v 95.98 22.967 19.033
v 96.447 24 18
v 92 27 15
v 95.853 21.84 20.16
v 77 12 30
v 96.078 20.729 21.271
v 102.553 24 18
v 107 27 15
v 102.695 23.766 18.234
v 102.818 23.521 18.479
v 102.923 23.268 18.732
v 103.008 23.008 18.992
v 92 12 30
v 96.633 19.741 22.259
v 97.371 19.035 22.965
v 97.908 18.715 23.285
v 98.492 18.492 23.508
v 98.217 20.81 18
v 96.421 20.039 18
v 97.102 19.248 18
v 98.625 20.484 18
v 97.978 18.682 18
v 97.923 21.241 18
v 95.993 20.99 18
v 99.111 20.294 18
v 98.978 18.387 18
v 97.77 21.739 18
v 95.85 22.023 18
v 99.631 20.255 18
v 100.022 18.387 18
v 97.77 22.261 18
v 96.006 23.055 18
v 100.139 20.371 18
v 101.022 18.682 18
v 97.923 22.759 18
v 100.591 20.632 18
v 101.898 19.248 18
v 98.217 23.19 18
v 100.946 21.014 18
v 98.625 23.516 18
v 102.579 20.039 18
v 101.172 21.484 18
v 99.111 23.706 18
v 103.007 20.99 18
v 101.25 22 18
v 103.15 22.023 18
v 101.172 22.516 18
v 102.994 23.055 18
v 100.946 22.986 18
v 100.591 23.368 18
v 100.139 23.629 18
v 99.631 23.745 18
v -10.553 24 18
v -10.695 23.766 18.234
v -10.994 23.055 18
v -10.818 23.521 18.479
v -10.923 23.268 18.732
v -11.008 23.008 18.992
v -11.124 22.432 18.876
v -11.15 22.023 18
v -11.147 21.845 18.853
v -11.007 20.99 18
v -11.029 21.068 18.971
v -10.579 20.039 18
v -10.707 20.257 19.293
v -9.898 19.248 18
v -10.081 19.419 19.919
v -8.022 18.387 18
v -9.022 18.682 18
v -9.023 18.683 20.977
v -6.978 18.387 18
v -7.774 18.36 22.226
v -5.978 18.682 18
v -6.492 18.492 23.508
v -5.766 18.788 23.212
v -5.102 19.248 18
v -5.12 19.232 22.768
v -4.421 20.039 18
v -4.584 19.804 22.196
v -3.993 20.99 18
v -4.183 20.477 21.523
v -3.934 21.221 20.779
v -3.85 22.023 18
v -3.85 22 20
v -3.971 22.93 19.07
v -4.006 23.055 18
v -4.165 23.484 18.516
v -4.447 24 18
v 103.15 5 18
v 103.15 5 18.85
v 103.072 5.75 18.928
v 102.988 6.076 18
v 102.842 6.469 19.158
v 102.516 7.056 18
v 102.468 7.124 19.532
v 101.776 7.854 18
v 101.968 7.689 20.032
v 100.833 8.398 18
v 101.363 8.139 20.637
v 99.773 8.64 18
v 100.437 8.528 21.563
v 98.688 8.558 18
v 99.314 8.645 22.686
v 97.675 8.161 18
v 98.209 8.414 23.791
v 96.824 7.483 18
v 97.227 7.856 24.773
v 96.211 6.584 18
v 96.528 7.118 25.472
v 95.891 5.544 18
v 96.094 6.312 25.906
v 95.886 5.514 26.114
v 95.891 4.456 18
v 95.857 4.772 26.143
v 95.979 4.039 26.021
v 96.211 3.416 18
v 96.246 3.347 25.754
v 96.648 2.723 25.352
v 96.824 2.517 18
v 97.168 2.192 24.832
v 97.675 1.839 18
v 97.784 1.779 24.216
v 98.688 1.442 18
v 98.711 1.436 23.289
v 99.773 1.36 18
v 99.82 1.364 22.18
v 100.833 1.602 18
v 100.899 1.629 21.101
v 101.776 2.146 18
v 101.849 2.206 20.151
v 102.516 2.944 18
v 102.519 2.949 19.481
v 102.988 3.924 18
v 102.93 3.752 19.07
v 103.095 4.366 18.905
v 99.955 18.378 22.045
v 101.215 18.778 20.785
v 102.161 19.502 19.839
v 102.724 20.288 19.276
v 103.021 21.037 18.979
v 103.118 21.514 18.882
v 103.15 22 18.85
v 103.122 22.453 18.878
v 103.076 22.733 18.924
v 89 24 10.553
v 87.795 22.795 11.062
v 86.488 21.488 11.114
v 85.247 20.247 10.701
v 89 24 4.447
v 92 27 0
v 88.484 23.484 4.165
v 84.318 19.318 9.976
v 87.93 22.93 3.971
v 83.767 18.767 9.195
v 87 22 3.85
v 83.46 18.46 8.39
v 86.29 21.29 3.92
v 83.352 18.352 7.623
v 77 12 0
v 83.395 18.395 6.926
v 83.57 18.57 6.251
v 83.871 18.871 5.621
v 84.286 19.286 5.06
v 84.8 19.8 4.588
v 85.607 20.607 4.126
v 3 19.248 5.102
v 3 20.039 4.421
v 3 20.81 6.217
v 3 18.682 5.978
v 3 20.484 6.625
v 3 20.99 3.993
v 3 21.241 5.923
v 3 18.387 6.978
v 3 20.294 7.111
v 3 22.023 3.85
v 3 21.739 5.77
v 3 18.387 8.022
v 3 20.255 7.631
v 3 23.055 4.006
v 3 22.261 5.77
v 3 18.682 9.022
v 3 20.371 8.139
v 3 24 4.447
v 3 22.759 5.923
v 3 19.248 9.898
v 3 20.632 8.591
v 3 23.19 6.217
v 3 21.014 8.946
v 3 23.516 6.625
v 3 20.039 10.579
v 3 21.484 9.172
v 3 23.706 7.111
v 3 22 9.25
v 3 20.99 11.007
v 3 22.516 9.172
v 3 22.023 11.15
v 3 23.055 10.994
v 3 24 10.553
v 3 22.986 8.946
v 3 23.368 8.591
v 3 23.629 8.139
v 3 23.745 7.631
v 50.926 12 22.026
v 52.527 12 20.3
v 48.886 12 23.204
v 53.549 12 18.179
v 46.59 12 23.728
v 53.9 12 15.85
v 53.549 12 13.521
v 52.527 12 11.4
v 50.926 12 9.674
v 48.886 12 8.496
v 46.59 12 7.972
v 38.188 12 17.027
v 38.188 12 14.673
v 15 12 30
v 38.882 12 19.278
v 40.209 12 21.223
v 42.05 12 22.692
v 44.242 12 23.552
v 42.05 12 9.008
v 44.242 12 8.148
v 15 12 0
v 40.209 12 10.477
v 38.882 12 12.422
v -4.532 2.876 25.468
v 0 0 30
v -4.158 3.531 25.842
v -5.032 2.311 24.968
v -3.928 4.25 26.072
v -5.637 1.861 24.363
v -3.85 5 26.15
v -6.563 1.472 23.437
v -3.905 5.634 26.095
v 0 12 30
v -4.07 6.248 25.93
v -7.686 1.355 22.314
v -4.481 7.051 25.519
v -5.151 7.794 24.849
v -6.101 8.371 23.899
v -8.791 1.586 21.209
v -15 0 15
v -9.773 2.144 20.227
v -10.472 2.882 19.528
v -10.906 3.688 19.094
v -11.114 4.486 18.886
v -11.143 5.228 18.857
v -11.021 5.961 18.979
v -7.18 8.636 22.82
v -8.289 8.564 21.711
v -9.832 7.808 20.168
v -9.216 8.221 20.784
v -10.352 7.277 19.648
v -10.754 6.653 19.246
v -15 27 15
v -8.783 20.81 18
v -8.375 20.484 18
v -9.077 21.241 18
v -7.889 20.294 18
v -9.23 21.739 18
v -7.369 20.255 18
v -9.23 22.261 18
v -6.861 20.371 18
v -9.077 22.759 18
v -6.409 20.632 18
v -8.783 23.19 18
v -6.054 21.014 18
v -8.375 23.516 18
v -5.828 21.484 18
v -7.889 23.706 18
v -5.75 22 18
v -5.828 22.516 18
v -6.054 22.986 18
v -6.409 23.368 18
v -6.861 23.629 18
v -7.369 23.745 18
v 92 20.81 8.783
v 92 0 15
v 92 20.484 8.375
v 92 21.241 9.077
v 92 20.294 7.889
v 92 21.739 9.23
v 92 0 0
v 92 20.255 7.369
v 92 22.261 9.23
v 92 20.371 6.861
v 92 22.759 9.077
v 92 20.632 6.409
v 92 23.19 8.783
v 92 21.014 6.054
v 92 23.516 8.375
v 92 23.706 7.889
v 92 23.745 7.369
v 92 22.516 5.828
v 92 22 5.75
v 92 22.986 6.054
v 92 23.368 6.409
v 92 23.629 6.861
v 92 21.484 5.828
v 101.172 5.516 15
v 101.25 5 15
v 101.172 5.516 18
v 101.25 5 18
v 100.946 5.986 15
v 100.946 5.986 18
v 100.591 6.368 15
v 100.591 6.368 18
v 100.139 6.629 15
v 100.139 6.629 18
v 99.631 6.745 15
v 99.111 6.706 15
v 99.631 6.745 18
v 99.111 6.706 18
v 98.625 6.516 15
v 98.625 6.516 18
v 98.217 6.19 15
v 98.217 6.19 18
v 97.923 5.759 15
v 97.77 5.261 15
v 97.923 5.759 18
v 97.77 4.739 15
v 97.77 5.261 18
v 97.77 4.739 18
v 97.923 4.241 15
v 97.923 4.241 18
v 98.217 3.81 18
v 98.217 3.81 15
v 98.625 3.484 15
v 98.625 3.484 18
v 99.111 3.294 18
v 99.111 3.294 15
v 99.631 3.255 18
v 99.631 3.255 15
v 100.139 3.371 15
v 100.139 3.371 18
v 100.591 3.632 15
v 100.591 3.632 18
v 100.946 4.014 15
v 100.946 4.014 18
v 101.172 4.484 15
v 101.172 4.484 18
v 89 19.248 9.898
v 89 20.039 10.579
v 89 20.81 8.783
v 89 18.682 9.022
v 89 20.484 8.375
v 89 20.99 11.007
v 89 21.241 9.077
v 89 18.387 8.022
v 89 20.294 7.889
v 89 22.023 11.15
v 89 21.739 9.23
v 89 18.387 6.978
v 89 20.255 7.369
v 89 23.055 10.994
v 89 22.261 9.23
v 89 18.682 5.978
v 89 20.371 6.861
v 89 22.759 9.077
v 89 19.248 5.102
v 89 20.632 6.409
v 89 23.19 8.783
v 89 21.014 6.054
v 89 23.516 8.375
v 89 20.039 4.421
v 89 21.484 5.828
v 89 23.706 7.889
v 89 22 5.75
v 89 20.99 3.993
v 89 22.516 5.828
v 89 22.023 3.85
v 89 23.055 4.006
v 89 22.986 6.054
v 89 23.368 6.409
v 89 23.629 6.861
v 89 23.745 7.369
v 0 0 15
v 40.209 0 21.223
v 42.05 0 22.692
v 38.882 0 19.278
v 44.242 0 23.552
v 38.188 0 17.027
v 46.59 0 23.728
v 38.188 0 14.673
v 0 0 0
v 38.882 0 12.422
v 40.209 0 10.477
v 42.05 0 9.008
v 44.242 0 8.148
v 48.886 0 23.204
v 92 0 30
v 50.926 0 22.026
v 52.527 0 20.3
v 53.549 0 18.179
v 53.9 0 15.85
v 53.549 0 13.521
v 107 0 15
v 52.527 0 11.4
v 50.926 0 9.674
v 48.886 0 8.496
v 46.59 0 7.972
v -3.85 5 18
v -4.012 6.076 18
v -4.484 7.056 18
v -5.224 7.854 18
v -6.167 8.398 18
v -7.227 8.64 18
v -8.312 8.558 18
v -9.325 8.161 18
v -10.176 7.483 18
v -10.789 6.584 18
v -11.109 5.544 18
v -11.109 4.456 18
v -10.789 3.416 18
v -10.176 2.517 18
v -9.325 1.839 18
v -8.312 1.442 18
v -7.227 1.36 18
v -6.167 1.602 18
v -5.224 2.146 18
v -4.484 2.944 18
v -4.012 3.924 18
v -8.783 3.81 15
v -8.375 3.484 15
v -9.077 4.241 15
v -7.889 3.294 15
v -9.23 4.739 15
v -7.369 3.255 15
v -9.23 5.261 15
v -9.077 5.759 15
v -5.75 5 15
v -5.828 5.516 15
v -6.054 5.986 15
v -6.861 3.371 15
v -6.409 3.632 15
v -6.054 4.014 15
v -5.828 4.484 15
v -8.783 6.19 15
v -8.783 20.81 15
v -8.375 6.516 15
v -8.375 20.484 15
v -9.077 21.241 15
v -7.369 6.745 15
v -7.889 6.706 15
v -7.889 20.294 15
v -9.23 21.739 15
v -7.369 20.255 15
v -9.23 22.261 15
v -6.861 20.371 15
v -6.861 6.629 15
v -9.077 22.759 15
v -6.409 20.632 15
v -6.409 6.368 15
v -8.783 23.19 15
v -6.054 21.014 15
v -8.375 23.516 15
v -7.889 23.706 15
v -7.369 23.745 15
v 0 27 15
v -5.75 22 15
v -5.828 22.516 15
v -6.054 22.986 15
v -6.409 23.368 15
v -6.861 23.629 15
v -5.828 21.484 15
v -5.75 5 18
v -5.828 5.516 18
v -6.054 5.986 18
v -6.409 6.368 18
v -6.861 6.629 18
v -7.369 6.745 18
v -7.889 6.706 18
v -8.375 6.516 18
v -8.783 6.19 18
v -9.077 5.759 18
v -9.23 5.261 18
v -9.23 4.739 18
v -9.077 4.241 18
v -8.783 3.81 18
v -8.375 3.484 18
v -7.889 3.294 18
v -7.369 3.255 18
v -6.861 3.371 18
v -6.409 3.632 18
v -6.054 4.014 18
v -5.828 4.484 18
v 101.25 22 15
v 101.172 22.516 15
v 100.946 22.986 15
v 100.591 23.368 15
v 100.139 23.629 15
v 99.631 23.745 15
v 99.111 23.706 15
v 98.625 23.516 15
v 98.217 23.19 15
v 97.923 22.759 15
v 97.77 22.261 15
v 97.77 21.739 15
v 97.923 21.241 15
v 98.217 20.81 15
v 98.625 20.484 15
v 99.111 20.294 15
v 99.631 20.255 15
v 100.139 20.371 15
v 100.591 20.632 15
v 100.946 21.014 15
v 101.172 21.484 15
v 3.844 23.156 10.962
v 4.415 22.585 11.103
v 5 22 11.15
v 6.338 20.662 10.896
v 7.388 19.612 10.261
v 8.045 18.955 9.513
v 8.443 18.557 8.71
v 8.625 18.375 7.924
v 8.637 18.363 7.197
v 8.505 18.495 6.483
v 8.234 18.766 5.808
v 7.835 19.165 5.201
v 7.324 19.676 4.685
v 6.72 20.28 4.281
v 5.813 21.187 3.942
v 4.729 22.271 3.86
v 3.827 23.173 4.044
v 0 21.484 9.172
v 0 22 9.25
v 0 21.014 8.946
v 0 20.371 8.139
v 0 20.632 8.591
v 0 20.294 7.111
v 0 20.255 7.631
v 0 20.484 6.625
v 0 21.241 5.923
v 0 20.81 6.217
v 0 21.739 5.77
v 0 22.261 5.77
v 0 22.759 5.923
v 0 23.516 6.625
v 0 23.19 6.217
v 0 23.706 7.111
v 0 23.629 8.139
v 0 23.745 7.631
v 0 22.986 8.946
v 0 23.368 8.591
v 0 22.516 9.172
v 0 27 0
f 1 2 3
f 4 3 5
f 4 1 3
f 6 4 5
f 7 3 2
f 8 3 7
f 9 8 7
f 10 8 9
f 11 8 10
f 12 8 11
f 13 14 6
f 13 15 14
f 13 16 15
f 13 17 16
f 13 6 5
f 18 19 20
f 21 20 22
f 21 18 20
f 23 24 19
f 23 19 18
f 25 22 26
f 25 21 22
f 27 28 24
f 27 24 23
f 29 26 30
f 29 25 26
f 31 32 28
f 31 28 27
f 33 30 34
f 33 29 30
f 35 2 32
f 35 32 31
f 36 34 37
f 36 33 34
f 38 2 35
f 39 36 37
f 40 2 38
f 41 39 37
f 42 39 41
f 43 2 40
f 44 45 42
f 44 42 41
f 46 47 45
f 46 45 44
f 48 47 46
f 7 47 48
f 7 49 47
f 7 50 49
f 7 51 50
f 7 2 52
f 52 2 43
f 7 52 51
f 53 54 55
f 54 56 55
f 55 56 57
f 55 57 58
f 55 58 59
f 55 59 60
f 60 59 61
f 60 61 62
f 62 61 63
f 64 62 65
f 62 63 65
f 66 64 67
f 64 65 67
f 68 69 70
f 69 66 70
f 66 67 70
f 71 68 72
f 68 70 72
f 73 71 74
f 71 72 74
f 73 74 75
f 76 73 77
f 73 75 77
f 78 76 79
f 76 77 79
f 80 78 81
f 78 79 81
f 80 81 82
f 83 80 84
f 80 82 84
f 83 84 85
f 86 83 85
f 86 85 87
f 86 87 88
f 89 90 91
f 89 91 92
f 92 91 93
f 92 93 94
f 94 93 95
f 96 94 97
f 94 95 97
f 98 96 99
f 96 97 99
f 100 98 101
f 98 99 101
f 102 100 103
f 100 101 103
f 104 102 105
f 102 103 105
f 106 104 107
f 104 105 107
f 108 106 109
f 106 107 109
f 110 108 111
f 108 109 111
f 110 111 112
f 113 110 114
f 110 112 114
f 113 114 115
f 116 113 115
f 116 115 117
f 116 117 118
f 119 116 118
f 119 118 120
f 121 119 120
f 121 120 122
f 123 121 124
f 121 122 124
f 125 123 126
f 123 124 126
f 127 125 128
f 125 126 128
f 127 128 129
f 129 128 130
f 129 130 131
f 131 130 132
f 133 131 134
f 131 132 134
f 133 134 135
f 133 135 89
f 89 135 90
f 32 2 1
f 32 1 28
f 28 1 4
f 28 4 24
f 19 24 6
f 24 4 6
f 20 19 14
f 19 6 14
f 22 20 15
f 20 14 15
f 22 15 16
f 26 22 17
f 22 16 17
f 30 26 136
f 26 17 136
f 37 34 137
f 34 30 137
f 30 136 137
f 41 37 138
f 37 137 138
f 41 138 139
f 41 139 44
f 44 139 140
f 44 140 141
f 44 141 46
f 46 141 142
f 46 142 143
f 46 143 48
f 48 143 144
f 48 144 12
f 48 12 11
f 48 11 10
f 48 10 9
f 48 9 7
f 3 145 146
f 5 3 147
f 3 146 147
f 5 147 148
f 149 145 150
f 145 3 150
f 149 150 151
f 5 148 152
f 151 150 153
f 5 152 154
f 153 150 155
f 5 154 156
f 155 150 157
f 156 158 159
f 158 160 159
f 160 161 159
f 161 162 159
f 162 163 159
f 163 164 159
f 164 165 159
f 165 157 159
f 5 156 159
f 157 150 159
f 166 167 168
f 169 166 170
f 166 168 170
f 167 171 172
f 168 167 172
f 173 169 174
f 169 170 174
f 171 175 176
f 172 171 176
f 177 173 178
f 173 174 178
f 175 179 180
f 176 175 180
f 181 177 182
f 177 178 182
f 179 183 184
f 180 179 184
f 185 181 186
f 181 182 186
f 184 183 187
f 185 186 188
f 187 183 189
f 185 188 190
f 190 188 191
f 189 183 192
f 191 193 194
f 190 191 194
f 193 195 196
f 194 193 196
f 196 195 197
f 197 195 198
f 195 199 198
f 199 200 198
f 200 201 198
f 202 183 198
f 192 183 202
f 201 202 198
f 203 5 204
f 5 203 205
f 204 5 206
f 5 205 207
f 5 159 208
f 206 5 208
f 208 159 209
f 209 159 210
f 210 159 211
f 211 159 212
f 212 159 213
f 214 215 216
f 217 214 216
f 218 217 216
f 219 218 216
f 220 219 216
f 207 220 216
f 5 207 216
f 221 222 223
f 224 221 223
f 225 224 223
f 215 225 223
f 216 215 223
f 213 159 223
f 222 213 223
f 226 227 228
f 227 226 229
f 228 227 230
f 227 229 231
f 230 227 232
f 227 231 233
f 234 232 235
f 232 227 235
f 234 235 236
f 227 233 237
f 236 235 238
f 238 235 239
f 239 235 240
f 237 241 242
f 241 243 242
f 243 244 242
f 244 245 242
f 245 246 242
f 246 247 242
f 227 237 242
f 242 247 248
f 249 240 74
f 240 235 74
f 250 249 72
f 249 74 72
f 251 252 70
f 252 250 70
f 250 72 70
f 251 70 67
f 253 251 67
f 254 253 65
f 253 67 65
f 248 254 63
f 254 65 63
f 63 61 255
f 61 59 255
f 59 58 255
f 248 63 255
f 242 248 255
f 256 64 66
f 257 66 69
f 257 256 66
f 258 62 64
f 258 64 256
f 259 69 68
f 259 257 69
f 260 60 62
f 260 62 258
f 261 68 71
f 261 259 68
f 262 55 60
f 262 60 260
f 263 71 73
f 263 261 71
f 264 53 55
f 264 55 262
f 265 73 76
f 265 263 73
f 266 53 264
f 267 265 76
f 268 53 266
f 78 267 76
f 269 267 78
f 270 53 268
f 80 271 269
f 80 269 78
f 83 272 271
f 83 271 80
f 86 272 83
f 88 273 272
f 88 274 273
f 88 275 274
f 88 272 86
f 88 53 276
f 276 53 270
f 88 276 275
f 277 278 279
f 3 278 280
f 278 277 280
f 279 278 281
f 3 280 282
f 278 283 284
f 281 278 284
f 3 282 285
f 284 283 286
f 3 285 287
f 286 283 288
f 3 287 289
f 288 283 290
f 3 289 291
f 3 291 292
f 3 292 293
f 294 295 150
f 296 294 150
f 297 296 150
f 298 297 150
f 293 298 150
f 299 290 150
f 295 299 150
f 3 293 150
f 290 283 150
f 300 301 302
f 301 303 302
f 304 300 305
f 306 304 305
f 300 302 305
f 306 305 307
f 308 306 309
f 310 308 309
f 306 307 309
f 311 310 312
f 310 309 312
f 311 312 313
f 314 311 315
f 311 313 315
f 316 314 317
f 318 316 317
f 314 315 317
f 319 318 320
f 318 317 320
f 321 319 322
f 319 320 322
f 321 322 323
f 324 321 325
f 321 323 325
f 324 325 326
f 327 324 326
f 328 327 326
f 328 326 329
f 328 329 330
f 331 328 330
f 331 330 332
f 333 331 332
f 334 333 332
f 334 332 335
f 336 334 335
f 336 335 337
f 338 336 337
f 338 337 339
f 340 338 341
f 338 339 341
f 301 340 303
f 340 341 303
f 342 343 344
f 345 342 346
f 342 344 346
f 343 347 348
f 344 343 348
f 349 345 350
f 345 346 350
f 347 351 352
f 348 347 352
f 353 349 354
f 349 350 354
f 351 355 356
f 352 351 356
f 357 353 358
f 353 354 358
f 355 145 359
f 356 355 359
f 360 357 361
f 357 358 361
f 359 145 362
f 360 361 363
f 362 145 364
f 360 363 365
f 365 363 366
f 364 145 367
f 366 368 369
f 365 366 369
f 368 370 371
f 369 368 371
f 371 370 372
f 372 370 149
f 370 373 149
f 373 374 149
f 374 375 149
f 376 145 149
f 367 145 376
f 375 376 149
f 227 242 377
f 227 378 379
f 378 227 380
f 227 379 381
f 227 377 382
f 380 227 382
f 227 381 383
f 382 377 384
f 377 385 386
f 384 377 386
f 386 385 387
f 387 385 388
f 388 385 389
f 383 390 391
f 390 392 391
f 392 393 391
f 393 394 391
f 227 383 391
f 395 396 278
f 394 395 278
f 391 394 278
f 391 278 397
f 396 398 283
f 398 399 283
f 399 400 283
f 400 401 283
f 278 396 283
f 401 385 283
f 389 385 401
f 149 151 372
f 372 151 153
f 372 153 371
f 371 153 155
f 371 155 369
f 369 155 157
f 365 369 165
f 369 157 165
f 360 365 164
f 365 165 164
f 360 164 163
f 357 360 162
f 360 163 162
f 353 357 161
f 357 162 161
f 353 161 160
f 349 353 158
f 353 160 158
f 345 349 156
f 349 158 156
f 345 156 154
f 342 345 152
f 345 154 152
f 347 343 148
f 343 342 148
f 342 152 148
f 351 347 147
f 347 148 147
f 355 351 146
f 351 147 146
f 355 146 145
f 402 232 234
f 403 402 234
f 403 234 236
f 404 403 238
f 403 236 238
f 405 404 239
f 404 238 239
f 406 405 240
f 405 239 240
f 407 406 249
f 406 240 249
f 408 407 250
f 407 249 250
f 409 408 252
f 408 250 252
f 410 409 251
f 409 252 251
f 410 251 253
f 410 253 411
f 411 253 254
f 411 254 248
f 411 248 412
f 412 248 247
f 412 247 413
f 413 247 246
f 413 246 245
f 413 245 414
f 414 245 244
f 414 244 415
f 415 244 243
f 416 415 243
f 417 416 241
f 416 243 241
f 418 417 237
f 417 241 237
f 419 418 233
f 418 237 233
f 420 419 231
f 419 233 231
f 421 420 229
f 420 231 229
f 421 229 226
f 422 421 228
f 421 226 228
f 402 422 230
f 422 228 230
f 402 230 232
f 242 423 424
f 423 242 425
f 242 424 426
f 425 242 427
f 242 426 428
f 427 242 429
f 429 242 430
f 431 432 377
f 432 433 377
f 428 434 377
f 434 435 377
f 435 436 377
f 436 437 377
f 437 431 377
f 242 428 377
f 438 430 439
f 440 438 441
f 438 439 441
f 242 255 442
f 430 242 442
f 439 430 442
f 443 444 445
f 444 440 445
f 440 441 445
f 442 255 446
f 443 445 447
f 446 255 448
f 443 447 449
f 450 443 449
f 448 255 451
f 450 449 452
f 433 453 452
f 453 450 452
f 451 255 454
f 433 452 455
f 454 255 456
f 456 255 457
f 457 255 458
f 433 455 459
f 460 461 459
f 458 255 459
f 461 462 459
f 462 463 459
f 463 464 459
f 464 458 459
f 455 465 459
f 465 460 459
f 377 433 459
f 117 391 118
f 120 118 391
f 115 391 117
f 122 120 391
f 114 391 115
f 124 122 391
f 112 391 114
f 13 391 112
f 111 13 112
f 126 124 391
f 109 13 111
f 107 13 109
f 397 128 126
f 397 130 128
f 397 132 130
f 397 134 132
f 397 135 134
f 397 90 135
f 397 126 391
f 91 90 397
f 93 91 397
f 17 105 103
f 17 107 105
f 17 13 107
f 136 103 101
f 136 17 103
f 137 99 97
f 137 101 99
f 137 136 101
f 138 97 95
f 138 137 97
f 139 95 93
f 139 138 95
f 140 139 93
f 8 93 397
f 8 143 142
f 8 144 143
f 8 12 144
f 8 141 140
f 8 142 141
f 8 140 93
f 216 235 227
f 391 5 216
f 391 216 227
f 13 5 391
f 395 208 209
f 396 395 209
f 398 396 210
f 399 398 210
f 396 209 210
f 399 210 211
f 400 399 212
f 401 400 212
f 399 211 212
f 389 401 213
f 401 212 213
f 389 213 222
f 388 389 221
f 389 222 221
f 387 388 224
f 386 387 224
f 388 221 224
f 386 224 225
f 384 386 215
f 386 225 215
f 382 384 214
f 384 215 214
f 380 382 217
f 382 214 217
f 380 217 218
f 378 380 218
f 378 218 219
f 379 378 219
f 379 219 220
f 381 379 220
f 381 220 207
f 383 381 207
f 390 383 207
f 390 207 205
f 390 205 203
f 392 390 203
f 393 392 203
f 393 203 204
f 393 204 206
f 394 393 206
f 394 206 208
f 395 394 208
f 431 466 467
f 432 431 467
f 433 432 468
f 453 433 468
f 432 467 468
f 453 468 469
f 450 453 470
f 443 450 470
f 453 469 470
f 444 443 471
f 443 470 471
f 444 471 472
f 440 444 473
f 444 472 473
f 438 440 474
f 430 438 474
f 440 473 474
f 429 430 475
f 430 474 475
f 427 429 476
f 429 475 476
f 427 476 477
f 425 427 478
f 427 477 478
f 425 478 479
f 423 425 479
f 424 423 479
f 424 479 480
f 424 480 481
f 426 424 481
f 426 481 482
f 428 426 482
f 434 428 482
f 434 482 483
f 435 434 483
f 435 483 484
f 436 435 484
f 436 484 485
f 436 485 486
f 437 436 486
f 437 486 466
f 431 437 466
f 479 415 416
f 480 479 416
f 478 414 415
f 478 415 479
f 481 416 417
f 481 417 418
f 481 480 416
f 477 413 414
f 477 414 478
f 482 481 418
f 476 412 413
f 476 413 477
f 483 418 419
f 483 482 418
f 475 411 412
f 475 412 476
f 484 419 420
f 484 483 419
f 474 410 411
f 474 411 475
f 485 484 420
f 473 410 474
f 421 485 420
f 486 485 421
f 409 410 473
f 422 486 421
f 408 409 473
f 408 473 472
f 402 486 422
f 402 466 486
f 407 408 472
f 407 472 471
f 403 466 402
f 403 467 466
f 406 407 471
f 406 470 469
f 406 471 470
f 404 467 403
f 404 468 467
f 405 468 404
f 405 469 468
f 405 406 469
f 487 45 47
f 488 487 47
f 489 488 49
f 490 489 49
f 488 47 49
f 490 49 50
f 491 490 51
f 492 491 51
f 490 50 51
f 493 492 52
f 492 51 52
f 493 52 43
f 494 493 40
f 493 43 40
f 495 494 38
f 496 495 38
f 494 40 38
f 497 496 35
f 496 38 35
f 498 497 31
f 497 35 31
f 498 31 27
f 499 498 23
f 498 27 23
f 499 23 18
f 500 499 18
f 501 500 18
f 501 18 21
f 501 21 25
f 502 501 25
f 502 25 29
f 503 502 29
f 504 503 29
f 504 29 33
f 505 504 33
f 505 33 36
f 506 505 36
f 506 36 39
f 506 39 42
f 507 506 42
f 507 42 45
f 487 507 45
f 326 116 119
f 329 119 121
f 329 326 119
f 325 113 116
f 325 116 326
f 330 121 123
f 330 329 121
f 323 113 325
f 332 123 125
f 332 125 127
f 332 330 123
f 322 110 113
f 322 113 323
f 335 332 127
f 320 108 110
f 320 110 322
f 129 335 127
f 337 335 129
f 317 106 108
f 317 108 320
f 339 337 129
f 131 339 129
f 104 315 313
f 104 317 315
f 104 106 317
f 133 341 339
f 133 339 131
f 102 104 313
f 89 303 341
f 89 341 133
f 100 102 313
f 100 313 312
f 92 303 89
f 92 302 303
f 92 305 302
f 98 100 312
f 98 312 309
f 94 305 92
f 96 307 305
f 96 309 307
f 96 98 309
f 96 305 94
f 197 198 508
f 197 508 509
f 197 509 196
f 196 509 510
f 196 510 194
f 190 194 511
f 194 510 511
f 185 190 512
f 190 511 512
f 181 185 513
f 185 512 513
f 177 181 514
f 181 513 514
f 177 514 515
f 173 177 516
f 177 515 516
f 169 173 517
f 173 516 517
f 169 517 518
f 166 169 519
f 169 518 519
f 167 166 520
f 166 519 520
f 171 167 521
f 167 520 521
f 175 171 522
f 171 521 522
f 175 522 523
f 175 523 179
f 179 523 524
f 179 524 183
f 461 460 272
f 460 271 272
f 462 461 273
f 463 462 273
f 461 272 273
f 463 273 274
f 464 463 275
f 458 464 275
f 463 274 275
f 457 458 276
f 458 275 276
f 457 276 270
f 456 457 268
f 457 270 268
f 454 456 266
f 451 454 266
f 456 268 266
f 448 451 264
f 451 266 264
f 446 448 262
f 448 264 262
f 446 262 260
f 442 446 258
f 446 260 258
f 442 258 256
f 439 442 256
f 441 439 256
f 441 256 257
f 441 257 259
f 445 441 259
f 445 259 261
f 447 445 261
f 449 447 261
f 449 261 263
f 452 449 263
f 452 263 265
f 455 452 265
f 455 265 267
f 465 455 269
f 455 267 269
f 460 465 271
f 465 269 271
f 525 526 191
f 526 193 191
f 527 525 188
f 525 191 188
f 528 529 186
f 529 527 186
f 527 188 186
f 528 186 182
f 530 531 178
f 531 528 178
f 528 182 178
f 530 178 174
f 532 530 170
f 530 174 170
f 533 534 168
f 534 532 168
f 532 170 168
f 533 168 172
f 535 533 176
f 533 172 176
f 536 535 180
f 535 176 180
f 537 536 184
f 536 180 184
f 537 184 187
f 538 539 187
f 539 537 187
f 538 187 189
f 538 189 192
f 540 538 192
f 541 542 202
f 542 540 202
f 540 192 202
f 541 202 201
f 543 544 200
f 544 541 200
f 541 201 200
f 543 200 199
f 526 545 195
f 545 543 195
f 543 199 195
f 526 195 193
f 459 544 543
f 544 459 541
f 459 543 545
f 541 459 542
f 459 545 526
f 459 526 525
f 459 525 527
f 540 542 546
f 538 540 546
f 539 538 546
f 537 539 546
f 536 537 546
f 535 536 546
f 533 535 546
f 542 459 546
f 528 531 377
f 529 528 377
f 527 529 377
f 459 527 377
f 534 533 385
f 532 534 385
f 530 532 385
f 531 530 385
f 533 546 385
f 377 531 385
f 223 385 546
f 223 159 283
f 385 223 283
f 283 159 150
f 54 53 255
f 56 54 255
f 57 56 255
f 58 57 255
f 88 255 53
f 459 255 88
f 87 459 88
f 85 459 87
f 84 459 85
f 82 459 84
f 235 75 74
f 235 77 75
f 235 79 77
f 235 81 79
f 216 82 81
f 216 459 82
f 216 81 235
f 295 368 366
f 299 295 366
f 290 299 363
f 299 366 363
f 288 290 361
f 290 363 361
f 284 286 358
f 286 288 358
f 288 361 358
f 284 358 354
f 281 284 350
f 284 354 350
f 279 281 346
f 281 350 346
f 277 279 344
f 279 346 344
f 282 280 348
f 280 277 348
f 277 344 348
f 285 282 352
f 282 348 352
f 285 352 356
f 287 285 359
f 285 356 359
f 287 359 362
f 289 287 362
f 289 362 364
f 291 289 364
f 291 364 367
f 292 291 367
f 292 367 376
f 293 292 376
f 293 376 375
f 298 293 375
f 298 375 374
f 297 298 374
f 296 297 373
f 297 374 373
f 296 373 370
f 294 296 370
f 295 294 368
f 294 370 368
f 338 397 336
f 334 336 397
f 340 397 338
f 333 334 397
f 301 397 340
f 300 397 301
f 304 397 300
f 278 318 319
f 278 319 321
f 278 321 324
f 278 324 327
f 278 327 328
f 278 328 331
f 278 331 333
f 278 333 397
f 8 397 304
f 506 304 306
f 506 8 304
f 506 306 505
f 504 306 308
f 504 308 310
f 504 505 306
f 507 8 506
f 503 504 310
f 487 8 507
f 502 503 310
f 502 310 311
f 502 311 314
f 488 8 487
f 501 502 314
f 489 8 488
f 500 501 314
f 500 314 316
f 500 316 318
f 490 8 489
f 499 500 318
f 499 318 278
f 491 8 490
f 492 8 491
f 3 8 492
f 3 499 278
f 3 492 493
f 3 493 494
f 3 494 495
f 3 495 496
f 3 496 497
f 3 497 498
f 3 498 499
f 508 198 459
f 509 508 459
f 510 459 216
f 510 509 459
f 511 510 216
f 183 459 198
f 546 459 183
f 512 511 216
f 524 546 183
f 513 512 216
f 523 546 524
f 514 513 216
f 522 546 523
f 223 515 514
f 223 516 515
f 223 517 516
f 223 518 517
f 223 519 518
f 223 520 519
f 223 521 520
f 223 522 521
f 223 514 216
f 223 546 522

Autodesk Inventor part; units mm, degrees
ref_plane "YZ Plane" through (0, 0, 0) normal (1, 0, 0) x (0, 1, 0)
sketch "Sketch1" plane through (0, 0, 0) normal (0, 0, 1) x (1, 0, 0)
  line L0 (0, 0) -> (92, 0)
  line L1 (92, 0) -> (92, 12)
  line L2 (92, 12) -> (0, 12)
  line L3 (0, 12) -> (0, 0)
  dimension "d0" = 92
  dimension "d1" = 12
extrude "Extrusion1" add sketch "Sketch1" along normal blind 30
sketch "Sketch3" plane through (0, 12, 30) normal (0, 1, 0) x (1, 0, 0)
  line L0 (0, 30) -> (0, 0) projected
  line L1 (92, 30) -> (0, 30) projected
  circle A0 centre (46, 14.15) radius 7.9
  point P0 (0, 17)
  point P1 (107, 32)
  point P2 (15, 32)
  dimension "d8" = 15.8
  dimension "d9" = 15.85
  dimension "d10" = 46
extrude "Extrusion3" cut sketch "Sketch3" against normal up to next
sketch "Sketch4" plane through (0, 12, 0) normal (0, 1, 0) x (1, 0, 0)
  line L0 (0, 0) -> (0, -30) projected
  line L1 (92, 0) -> (92, -30) projected
  line L2 (0, -30) -> (-15, -15)
  line L3 (-15, -15) -> (0, -15)
  line L4 (92, -30) -> (107, -15)
  line L5 (107, -15) -> (92, -15)
  dimension "d13" = 45
  dimension "d14" = 45
extrude "Extrusion4" add sketch "Sketch4" against normal up to surface (12 mm away)
sketch "Sketch5" plane through (0, 0, 0) normal (1, 0, 0) x (0, 1, 0)
  line L0 (0, 15) -> (0, 30) projected
  line L1 (12, 30) -> (0, 30) projected
  line L2 (12, 15) -> (12, 30) projected
  line L3 (12, 15) -> (0, 15) projected
  line L4 (12, 15) -> (27, 15)
  line L5 (27, 15) -> (12, 30)
  point P0 (0, 0)
  dimension "d17" = 15
extrude "Extrusion5" add sketch "Sketch5" against normal up to surface contours L2 L5 L4 surface through (0, 12, 30) normal (-0.7071, 0, 0.7071)
sketch "Sketch6" plane through (92, 0, 0) normal (1, 0, 0) x (0, 0, -1)
  line L0 (-30, 0) -> (-15, 0) projected
  line L1 (-15, 12) -> (-15, 0) projected
  line L2 (-30, 12) -> (-15, 12) projected
  line L3 (-30, 0) -> (-30, 12) projected
  line L4 (-15, 12) -> (-15, 27)
  line L5 (-15, 27) -> (-30, 12)
  dimension "d20" = 15
extrude "Extrusion6" add sketch "Sketch6" along normal up to surface contours L5 L4 L2 surface through (107, 12, 15) normal (0.7071, 0, 0.7071)
sketch "Sketch7" plane through (0, 0, 0) normal (0, 0, -1) x (-1, 0, 0)
  line L0 (-92, 12) -> (0, 12) projected
  line L1 (-92, 12) -> (-92, 27)
  line L2 (-92, 27) -> (-77, 12)
  line L3 (0, 12) -> (0, 27)
  line L4 (0, 27) -> (-15, 12)
  dimension "d23" = 15
  dimension "d24" = 15
extrude "Extrusion7" add sketch "Sketch7" against normal up to surface surface through (92, 27, 15) normal (0, 0.7071, 0.7071)
sketch "Sketch8" plane through (0, 0, 30) normal (0, 0, 1) x (1, 0, 0)
  line L0 (-15, 0) -> (0, 0) projected
  line L1 (0, 12) -> (0, 0) projected
  line L2 (-15, 27) -> (0, 12) projected
  line L3 (-15, 0) -> (-15, 27) projected
  line L4 (92, 0) -> (107, 0) projected
  line L5 (107, 27) -> (107, 0) projected
  line L6 (92, 12) -> (107, 27) projected
  line L7 (92, 0) -> (92, 12) projected
  circle A0 centre (-7.5, 5) radius 1.75
  circle A1 centre (-7.5, 22) radius 1.75
  circle A2 centre (99.5, 22) radius 1.75
  circle A3 centre (99.5, 5) radius 1.75
  line L8 (92, 27) -> (107, 27) projected
  dimension "d27" = 3.5
  dimension "d28" = 7.5
  dimension "d29" = 7.5
  dimension "d30" = 5
  dimension "d31" = 5
extrude "Extrusion8" cut sketch "Sketch8" against normal up to surface (15 mm away) contours A0 | A1 | A2 | A3
sketch "Sketch9" plane through (0, 0, 30) normal (0, 0, 1) x (1, 0, 0)
  circle A0 centre (-7.5, 22) radius 1.75 projected
  circle A1 centre (-7.5, 5) radius 1.75 projected
  circle A2 centre (99.5, 22) radius 1.75 projected
  circle A3 centre (99.5, 5) radius 1.75 projected
  circle A4 centre (-7.5, 22) radius 3.65
  circle A5 centre (-7.5, 5) radius 3.65
  circle A6 centre (99.5, 22) radius 3.65
  circle A7 centre (99.5, 5) radius 3.65
  dimension "d34" = 7.3
extrude "Extrusion9" cut sketch "Sketch9" against normal blind 12
ref_plane "Work Plane1" through (77, 0, 15) normal (1, 0, 0) x (0, 0, -1)
sketch "Sketch10" plane through (77, 0, 15) normal (1, 0, 0) x (0, 0, -1)
  line L0 (-15, 12) -> (0, 27) projected
  line L1 (15, 27) -> (0, 27) projected
  line L2 (15, 12) -> (15, 27) projected
  line L3 (-15, 12) -> (15, 12) projected
  circle A0 centre (7.5, 22) radius 1.75
  circle A1 centre (7.5, 22) radius 3.65
  point P0 (15, 0)
  dimension "d38" = 3.5
  dimension "d39" = 7.3
  dimension "d40" = 5
  dimension "d41" = 7.5
extrude "Extrusion10" cut sketch "Sketch10" along normal up to surface (15 mm away) contours A0
sketch "Sketch11" plane through (77, 0, 15) normal (1, 0, 0) x (0, 0, -1)
  circle A0 centre (7.5, 22) radius 1.75 projected
  circle A1 centre (7.5, 22) radius 3.65
  point P0 (15, 0)
  dimension "d44" = 7.3
extrude "Extrusion11" cut sketch "Sketch11" along normal blind 12
ref_plane "Work Plane2" through (15, 0, 0) normal (-1, 0, 0) x (0, 0, 1)
sketch "Sketch12" plane through (15, 0, 0) normal (-1, 0, 0) x (0, 0, 1)
  line L0 (15, 27) -> (30, 12) projected
  line L1 (0, 12) -> (30, 12) projected
  line L2 (0, 27) -> (0, 12) projected
  line L3 (0, 27) -> (15, 27) projected
  circle A0 centre (7.5, 22) radius 1.75
  point P0 (0, 0)
  dimension "d48" = 3.5
  dimension "d49" = 7.5
  dimension "d50" = 5
extrude "Extrusion12" cut sketch "Sketch12" along normal up to surface (15 mm away) contours A0
sketch "Sketch13" plane through (15, 0, 0) normal (-1, 0, 0) x (0, 0, 1)
  circle A0 centre (7.5, 22) radius 1.75 projected
  circle A1 centre (7.5, 22) radius 1.75 projected
  circle A2 centre (7.5, 22) radius 3.65
  point P0 (0, 0)
  dimension "d53" = 7.3
extrude "Extrusion13" cut sketch "Sketch13" along normal blind 12
properties part number "ZAxisNutMount"
